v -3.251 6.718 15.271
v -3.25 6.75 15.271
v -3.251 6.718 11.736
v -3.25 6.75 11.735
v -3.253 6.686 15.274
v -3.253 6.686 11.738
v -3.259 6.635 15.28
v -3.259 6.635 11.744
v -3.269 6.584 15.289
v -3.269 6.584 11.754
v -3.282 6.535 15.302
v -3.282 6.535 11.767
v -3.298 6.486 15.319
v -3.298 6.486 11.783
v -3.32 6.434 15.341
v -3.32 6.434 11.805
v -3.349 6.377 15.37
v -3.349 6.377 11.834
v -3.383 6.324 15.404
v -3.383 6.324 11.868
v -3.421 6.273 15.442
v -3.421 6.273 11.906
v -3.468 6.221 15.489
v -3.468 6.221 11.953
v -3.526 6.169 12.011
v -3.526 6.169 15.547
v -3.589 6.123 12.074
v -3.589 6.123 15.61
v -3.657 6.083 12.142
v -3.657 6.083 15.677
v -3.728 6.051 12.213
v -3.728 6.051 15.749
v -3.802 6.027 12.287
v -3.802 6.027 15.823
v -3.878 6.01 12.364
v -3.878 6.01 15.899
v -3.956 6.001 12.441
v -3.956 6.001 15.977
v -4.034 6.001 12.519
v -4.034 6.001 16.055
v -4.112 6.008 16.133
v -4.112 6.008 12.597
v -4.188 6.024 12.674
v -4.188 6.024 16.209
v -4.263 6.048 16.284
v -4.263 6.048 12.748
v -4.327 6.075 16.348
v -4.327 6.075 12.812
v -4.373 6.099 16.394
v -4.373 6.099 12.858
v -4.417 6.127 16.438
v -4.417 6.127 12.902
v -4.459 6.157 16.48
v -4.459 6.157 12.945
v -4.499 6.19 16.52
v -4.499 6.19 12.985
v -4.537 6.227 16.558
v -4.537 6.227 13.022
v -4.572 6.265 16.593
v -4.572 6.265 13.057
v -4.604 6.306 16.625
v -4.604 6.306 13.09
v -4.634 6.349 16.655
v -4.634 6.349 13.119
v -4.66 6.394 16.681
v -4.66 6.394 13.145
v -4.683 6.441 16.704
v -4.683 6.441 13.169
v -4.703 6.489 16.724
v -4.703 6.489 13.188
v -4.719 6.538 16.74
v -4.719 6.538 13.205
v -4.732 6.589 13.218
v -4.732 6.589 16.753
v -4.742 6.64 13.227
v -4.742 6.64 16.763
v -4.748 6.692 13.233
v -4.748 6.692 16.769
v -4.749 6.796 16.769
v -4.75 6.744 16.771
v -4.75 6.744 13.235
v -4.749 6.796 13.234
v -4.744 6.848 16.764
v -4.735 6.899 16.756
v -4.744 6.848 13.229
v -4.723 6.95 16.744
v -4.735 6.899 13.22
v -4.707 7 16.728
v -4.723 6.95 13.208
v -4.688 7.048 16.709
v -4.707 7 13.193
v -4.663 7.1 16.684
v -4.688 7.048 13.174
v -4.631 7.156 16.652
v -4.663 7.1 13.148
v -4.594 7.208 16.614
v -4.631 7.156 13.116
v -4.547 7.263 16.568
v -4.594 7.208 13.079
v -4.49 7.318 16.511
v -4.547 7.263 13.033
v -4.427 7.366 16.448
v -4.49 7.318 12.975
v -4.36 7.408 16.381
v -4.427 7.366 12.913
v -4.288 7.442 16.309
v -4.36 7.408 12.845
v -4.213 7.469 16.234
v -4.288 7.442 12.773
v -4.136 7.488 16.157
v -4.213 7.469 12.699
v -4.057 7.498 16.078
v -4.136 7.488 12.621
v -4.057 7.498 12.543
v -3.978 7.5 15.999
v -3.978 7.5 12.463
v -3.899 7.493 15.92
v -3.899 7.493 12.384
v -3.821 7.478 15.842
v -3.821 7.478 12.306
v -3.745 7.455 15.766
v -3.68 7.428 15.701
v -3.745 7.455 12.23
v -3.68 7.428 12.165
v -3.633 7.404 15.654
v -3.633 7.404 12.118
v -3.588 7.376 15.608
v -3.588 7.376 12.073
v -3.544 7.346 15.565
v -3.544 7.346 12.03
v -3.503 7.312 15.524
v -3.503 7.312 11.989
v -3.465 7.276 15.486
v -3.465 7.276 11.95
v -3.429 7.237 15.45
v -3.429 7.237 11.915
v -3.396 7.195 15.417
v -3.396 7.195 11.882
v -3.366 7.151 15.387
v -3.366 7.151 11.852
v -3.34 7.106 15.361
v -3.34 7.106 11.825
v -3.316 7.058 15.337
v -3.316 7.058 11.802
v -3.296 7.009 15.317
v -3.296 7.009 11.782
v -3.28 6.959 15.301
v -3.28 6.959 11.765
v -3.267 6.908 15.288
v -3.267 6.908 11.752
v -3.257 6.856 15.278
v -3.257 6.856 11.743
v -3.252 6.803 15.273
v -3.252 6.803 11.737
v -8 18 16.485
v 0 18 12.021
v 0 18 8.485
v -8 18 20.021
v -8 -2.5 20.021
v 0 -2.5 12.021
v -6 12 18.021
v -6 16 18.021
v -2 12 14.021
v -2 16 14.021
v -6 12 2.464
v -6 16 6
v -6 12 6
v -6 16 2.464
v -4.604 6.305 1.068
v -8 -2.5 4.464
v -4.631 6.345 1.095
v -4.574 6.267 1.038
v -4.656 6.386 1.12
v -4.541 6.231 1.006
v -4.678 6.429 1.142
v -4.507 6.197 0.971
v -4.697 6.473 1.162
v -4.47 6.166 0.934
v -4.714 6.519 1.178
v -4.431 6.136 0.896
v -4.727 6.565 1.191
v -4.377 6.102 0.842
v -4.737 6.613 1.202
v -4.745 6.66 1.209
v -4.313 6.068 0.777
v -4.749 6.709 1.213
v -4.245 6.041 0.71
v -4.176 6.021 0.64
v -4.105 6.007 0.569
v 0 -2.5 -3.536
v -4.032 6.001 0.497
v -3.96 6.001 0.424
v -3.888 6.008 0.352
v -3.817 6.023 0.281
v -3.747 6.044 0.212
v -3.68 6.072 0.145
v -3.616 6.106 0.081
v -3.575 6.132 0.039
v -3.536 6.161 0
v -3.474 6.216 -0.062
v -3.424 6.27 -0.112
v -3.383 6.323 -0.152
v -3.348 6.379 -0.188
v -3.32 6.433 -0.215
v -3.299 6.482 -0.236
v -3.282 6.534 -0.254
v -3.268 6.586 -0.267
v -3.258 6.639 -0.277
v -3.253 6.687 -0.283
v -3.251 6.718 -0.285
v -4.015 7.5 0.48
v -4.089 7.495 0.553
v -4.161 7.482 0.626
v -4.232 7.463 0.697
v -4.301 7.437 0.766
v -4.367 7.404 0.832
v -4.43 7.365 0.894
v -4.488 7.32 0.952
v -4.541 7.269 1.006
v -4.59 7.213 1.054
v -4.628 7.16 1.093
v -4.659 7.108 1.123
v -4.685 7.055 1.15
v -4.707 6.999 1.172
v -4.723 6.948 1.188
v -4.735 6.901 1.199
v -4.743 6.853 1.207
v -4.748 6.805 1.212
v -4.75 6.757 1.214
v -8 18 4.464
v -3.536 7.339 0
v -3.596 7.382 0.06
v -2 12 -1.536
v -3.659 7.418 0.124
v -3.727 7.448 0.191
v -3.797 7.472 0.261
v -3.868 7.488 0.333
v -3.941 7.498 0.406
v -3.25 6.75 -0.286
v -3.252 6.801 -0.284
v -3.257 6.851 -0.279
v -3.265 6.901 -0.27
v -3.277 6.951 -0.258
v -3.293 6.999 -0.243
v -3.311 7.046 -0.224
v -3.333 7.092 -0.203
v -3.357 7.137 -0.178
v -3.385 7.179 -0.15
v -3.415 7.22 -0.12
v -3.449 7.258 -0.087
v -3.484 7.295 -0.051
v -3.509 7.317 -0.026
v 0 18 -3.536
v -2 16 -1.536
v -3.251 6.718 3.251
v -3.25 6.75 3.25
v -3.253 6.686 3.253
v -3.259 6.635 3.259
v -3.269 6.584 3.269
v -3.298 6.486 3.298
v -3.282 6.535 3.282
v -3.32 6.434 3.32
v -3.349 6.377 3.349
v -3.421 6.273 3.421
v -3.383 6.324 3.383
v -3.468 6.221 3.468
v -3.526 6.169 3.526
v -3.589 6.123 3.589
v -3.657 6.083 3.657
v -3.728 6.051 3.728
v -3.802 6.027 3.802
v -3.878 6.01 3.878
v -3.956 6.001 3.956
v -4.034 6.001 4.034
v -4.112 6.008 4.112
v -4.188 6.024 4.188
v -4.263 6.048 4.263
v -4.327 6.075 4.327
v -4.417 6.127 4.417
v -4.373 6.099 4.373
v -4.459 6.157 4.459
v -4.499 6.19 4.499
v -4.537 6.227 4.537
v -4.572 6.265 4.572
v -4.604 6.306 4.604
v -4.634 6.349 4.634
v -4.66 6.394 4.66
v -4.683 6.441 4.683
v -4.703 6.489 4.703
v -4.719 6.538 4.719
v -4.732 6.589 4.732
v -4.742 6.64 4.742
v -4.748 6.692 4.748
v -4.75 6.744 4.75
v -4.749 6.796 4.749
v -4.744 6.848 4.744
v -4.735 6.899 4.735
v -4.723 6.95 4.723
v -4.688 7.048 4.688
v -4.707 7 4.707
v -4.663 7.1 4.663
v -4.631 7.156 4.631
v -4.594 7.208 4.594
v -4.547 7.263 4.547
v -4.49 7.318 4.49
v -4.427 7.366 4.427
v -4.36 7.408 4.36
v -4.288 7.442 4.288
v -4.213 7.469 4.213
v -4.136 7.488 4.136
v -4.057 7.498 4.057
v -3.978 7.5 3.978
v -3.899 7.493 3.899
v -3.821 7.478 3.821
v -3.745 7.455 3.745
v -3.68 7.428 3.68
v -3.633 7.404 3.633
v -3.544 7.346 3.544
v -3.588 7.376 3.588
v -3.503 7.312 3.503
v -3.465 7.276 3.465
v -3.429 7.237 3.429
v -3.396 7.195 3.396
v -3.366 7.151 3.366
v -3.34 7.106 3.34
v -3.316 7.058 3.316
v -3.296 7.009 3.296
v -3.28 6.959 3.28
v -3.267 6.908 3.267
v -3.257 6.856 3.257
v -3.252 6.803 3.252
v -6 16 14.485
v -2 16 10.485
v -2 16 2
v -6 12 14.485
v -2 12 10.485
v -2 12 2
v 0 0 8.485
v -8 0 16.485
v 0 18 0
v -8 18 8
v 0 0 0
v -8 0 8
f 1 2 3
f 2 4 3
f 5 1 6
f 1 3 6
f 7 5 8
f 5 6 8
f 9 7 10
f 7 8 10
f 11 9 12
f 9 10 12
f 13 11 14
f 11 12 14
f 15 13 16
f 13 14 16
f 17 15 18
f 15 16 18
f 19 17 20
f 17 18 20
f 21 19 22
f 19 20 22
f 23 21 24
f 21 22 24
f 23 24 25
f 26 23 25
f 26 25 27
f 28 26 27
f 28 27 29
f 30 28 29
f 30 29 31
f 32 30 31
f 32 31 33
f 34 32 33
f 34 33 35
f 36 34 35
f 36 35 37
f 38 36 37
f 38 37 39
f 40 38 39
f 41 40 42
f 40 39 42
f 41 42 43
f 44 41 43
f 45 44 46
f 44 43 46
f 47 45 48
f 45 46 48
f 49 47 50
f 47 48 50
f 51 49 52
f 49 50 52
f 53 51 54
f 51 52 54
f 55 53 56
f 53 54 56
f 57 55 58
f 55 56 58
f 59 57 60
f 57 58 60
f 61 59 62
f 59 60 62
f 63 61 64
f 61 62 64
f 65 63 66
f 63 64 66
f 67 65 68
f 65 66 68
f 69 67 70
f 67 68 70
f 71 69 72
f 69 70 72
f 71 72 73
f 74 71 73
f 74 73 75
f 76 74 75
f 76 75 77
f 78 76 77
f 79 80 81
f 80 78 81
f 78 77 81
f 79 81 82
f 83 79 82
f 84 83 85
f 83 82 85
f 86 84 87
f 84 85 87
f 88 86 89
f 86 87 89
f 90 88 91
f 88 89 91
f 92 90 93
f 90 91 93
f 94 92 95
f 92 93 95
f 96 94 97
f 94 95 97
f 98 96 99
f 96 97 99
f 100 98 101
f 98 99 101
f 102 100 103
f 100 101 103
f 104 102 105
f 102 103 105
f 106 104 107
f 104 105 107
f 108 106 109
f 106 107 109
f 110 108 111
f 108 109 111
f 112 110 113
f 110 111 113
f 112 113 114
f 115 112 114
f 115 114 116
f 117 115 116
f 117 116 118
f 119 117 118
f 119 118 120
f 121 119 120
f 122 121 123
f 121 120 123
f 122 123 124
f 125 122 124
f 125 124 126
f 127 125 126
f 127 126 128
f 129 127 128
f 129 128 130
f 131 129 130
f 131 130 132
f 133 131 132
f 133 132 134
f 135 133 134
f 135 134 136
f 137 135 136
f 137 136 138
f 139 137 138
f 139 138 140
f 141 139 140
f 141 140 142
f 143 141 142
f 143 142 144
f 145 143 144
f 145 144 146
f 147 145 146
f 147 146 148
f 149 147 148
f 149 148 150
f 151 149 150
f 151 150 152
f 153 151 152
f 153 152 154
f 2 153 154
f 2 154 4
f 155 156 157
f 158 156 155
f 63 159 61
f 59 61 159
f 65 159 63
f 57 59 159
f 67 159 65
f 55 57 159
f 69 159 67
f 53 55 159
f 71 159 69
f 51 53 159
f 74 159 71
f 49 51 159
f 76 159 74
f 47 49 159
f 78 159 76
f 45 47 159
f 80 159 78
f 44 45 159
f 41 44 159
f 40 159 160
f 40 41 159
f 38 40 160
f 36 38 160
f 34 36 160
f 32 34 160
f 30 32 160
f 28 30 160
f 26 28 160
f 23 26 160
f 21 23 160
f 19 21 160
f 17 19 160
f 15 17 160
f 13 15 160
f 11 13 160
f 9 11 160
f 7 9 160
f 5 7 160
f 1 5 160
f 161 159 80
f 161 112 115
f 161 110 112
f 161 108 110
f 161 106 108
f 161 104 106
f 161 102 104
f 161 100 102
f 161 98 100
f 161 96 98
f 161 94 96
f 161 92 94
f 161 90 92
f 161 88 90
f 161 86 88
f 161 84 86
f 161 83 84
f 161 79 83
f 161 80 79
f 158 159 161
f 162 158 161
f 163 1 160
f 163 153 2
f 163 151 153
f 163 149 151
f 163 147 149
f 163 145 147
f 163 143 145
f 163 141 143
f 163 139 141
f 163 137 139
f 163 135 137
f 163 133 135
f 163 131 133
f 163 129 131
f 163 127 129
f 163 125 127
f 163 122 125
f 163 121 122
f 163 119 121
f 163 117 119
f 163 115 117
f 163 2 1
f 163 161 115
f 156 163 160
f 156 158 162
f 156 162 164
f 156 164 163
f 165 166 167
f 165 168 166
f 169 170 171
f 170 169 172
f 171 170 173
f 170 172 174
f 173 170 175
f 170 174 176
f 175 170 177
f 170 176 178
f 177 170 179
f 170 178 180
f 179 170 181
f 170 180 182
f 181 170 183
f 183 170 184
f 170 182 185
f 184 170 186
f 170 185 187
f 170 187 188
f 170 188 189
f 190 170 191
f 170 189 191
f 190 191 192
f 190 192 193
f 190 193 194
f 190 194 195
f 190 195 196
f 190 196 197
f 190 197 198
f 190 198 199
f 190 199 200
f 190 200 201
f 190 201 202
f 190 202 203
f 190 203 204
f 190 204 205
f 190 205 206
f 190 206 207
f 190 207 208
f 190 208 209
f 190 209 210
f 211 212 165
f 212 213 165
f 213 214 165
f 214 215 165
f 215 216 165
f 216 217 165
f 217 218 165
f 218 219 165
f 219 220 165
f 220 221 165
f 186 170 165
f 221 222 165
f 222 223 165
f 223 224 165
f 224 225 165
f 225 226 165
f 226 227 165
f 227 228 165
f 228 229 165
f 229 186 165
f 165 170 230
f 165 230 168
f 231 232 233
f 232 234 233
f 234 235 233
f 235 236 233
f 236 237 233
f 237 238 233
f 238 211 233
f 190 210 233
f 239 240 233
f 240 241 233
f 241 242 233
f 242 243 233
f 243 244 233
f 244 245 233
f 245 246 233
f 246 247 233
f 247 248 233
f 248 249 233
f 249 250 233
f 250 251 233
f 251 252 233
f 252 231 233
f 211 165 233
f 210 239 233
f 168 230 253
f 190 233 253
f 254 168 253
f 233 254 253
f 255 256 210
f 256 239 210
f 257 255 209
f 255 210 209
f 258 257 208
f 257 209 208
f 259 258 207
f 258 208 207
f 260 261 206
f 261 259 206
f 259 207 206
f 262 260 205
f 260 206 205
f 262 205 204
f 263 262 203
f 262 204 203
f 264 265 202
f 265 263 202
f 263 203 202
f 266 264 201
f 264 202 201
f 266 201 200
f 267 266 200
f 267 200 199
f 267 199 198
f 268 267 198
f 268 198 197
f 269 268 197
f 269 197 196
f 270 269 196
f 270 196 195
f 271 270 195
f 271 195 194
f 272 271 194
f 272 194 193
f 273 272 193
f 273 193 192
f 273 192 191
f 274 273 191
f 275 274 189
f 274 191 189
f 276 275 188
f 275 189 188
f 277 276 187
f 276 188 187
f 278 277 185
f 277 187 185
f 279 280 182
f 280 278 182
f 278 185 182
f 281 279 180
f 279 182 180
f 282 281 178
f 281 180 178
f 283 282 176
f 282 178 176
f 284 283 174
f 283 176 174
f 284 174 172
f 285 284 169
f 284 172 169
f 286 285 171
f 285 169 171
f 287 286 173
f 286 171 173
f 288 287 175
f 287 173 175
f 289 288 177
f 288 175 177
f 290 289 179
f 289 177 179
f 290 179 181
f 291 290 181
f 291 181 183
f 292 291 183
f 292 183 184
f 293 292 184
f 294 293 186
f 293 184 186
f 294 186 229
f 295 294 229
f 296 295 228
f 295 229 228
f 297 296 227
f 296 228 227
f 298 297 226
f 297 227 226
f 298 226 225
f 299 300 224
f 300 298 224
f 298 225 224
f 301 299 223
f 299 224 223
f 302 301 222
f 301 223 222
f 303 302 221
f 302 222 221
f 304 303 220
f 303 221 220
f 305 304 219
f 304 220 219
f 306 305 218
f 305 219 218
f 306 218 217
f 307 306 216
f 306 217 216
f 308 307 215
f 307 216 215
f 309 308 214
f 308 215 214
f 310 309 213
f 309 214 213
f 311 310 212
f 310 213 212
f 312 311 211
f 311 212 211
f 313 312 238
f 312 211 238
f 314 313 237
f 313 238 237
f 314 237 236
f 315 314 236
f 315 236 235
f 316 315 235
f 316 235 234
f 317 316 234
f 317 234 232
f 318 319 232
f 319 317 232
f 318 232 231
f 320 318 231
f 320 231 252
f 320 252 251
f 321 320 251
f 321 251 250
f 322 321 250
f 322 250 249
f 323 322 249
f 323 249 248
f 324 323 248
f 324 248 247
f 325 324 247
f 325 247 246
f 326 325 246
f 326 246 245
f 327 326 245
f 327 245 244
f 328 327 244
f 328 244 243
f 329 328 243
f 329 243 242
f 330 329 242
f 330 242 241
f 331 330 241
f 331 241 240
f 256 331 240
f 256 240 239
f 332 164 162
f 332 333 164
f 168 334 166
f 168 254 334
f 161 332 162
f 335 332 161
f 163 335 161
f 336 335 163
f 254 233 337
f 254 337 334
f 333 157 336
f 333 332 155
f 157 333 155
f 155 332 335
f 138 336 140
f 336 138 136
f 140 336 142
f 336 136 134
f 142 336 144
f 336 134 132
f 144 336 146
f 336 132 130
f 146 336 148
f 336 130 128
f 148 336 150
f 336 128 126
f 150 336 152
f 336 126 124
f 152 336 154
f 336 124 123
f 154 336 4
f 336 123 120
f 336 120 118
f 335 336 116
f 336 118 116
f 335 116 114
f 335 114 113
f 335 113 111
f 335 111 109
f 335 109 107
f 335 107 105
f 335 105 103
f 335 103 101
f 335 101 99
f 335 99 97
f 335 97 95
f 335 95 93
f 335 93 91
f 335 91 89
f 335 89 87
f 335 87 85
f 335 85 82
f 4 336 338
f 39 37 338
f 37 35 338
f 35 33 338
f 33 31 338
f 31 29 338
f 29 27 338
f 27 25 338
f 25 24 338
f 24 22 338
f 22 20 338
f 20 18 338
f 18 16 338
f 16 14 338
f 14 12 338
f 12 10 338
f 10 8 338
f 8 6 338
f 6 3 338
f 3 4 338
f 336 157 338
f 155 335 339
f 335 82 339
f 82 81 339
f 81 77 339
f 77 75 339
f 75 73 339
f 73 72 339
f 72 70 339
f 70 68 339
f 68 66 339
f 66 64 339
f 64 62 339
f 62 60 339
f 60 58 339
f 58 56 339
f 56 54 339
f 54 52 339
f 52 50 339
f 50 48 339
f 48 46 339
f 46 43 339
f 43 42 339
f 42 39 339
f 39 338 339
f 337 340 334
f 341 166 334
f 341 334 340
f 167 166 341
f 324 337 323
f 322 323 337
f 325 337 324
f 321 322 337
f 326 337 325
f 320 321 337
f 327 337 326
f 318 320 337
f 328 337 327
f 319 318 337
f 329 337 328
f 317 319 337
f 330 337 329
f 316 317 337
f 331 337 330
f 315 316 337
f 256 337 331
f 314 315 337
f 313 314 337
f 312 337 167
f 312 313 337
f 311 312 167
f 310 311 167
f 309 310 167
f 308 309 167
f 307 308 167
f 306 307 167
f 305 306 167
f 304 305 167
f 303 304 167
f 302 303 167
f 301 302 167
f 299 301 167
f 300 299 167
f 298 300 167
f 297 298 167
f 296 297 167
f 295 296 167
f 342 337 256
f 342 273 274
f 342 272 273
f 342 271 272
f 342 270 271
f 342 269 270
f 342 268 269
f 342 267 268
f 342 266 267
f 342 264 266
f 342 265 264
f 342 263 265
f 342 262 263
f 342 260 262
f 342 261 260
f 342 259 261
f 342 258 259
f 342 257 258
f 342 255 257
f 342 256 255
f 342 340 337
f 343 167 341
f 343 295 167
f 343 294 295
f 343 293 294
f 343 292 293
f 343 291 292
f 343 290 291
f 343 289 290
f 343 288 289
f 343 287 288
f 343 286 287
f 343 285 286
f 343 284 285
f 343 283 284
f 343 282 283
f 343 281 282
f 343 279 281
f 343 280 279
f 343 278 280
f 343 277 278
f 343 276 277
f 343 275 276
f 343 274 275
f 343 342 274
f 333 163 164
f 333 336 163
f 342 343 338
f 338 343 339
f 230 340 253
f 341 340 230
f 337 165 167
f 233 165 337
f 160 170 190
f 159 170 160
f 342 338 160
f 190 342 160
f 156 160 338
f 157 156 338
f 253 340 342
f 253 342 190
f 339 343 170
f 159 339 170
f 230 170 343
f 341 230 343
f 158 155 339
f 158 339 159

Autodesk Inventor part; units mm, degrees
ref_plane "YZ Plane" through (0, 0, 0) normal (1, 0, 0) x (0, 1, 0)
ref_plane "XZ Plane" through (0, 0, 0) normal (0, 1, 0) x (-1, 0, 0)
ref_plane "XY Plane" through (0, 0, 0) normal (0, 0, 1) x (1, 0, 0)
sketch "Sketch2" plane through (0, 0, 0) normal (0, 1, 0) x (-1, 0, 0)
  line L0 (0, 0) -> (15.6172, 15.6172) construction
  line L1 (0, 0) -> (0, -11.6637) construction
  line L2 (-18.4102, -9.9249) -> (9.458, 17.9433) construction
  line L3 (0, 0) -> (8, 8)
  line L4 (8, 4.4645) -> (8, 4.4645)
  line L5 (8, 8) -> (8, 4.4645)
  line L6 (0, 0) -> (0, -3.5355)
  line L7 (0, 8.4853) -> (0, 12.0208)
  line L8 (0, 12.0208) -> (8, 20.0208)
  line L9 (8, 20.0208) -> (8, 16.4853)
  line L10 (0, 8.4853) -> (8, 16.4853)
  line L11 (8, 4.4645) -> (0, -3.5355)
  point P0 (-12.2426, -3.7574)
  dimension "d0" = 135
  dimension "d1" = 6
  dimension "d2" = 2.5
  dimension "d4" = 8
extrude "Extrusion1" add sketch "Sketch2" along normal blind 18
sketch "Sketch3" plane through (0, 0, 0) normal (0, -1, 0) x (1, 0, 0)
  line L0 (-8, 20.0208) -> (0, 12.0208) projected
  line L1 (-8, 4.4645) -> (0, -3.5355) projected
  line L2 (-8, 8) -> (-8, 4.4645) projected
  line L3 (0, 26.3321) -> (0, -17.8468) projected
  line L4 (-8, 16.4853) -> (-8, 20.0208) projected
  line L5 (0, 12.0208) -> (0, -3.5355)
  line L6 (-8, 4.4645) -> (-8, 20.0208)
  line L7 (-8, 20.0208) -> (0, 12.0208)
  line L8 (0, -3.5355) -> (-8, 4.4645)
  point P0 (0, 0)
extrude "Extrusion2" add sketch "Sketch3" along normal blind 2.5
sketch "Sketch4" plane through (0, 0, 0) normal (0, 0, 1) x (1, 0, 0)
  line L0 (-8, 18) -> (0, 18) projected
  line L1 (-2, 16) -> (-6, 16)
  line L2 (-6, 16) -> (-6, 12)
  line L3 (-6, 12) -> (-2, 12)
  line L4 (-2, 12) -> (-2, 16)
  line L5 (-4, 18) -> (-4, 0)
  line L6 (0, 0) -> (-8, 0) projected
  point P0 (-4, 16)
  dimension "d9" = 4
  dimension "d10" = 4
  dimension "d14" = 12
extrude "Extrusion3" cut sketch "Sketch4" along normal through all both and the other way through all
sketch "Sketch6" plane through (0, 0, 0) normal (0, 0, 1) x (1, 0, 0)
  line L0 (-2, 12) -> (-6, 12) projected
  line L1 (-4, 12) -> (-4, 2.9314) construction
  circle A0 centre (-4, 6.75) radius 0.75
  line L2 (0, 0) -> (-8, 0) projected
  dimension "d20" = 1.5
  dimension "d21" = 6
extrude "Extrusion5" cut sketch "Sketch6" along normal through all both and the other way through all
properties part number "gimbal_stick_fixation_big"
